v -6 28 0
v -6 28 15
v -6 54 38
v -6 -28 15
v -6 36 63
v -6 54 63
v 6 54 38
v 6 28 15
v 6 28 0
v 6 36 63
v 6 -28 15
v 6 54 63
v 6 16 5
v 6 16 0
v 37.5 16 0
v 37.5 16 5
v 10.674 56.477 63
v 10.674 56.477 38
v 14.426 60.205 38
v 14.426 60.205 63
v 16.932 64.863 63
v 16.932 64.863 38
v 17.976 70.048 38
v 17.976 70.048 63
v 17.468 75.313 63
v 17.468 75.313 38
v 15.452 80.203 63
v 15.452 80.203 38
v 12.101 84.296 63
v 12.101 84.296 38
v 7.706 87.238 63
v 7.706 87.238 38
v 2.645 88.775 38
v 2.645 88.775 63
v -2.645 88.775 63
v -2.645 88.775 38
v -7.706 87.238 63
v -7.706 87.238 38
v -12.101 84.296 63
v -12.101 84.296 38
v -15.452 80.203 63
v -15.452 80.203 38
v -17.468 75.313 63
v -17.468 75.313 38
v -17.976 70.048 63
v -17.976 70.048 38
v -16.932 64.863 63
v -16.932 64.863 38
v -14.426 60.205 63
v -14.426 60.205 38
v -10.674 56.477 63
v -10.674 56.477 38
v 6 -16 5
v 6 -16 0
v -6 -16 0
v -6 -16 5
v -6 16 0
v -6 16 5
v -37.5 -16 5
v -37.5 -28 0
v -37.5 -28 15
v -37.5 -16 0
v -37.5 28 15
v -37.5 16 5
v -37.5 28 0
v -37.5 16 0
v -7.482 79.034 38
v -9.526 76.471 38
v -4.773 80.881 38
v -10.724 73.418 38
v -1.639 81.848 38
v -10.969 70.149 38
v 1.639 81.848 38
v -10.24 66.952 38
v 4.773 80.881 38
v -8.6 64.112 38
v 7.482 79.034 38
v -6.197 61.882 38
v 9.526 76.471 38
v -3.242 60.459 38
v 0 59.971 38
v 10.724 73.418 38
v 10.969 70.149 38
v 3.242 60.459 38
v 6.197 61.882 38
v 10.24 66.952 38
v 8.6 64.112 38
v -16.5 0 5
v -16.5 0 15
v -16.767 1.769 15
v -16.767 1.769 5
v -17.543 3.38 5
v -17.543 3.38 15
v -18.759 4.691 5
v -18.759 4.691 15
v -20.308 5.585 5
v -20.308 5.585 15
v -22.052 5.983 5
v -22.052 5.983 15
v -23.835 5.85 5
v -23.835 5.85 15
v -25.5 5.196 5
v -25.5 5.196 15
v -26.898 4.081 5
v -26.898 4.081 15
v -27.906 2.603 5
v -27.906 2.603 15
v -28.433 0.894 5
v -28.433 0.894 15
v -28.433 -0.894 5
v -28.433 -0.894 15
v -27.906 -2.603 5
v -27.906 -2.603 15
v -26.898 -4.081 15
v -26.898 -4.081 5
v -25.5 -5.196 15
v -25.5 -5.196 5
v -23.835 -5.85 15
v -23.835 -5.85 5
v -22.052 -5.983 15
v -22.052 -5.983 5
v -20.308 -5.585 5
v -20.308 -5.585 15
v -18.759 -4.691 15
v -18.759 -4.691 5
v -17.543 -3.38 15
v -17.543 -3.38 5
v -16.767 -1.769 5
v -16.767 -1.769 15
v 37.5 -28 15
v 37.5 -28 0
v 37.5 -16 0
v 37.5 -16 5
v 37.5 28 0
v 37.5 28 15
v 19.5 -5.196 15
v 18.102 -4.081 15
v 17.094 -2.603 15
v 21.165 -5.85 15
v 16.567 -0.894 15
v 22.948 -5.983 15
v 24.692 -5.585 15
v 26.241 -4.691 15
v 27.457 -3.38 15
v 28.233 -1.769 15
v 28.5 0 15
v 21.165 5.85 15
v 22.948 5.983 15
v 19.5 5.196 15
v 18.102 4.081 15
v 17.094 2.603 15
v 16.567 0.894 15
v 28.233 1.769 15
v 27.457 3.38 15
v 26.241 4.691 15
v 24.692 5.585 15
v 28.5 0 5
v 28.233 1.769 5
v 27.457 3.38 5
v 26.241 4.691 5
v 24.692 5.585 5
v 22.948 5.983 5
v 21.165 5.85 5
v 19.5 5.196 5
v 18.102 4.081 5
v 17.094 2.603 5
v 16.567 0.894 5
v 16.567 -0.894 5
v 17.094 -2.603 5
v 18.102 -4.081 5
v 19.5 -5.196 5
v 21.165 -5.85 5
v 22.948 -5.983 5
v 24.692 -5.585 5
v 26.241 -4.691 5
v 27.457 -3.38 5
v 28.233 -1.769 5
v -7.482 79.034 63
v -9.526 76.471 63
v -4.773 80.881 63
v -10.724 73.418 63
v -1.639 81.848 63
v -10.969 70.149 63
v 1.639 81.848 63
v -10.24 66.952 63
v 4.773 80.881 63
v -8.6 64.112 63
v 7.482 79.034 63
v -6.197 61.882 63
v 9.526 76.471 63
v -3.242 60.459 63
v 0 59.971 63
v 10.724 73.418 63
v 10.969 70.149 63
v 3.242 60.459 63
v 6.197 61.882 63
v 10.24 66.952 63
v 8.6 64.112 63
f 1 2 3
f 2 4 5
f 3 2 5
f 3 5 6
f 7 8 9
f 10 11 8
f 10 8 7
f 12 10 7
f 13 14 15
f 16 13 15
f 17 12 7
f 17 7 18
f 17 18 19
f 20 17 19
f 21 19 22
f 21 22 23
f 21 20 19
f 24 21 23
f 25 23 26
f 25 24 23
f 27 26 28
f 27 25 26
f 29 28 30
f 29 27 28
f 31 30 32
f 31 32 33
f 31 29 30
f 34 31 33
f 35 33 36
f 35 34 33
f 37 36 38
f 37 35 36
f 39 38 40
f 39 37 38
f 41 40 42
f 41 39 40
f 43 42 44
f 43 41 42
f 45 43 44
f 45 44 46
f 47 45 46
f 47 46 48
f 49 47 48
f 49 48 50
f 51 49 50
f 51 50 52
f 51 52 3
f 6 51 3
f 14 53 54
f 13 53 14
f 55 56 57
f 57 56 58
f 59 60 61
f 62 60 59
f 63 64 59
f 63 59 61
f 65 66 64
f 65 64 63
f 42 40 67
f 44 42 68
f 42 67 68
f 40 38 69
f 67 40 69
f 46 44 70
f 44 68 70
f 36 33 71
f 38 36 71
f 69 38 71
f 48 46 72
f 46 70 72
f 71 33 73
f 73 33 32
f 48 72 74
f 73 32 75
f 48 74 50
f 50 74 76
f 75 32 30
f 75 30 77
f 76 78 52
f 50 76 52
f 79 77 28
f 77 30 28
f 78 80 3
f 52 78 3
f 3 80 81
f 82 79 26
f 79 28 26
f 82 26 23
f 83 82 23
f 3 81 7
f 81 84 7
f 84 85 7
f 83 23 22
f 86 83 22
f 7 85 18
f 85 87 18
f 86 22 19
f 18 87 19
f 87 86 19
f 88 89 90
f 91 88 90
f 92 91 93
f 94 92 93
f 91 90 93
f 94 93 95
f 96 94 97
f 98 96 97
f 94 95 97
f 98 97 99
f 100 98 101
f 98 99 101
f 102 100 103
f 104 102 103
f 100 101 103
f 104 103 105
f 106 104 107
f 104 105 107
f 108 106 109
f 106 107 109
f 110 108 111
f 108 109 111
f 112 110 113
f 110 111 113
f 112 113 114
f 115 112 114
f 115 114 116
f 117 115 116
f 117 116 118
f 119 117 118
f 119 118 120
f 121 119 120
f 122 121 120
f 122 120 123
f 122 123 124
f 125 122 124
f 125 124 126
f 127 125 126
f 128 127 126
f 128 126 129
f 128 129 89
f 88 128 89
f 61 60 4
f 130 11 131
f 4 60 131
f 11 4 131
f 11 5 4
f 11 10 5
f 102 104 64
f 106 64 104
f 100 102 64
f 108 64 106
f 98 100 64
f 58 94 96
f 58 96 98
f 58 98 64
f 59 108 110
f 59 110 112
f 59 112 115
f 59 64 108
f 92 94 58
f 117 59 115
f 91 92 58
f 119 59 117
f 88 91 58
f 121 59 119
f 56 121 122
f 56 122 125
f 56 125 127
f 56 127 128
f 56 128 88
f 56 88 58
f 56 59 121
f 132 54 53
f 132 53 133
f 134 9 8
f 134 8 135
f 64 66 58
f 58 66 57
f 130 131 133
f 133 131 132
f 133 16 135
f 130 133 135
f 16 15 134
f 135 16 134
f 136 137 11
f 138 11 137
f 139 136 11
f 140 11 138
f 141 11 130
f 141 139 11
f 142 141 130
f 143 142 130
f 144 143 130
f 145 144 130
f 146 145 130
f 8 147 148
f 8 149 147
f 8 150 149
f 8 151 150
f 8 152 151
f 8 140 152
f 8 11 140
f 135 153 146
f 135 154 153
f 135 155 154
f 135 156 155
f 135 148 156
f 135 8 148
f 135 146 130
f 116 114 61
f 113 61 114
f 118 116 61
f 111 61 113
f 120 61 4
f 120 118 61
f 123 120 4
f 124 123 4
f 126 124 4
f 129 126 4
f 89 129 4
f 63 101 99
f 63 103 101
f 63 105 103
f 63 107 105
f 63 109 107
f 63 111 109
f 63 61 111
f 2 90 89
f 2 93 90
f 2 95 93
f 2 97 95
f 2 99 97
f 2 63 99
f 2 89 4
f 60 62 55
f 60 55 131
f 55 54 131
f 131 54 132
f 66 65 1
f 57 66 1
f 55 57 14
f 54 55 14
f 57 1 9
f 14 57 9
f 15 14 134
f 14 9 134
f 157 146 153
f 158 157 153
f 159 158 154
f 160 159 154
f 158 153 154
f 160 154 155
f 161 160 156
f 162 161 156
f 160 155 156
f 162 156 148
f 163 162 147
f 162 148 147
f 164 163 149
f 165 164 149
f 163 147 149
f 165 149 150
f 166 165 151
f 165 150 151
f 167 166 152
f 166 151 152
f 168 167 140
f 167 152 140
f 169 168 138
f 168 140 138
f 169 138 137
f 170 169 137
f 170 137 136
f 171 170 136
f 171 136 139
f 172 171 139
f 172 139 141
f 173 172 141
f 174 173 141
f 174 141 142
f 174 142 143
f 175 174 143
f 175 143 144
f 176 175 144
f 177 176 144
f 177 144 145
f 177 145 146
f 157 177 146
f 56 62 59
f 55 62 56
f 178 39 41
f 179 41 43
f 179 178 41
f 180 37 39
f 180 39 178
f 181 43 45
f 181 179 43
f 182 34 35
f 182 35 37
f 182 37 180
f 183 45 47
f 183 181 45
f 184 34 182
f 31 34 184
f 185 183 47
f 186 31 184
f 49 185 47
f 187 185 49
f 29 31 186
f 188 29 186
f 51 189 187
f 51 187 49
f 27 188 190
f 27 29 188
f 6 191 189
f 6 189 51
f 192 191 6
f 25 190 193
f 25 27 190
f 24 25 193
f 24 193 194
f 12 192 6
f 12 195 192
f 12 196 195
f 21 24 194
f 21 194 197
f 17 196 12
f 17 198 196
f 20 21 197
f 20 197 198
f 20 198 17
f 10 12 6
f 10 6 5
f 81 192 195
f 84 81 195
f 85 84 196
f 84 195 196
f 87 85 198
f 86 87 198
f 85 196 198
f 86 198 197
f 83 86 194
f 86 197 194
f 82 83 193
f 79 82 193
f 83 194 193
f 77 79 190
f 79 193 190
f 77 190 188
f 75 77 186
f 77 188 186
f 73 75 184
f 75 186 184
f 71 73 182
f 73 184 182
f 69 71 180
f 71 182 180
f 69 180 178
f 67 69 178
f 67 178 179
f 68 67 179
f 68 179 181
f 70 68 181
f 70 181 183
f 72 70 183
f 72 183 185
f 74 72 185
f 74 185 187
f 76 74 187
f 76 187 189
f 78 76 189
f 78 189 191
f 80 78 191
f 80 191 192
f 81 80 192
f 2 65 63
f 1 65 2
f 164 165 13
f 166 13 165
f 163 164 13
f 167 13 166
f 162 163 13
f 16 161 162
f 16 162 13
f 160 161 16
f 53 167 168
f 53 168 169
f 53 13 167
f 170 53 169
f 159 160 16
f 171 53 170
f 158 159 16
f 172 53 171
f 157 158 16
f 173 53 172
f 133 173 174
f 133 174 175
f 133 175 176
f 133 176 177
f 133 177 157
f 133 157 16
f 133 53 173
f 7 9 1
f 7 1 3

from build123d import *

# Parameters (mm, degrees)
SKETCH_W        = 75
SKETCH_H        = 56
PAD_DEPTH       = 15
SKETCH001_R     = 6
POCKET_DEPTH    = 15.001
SKETCH002_W     = 111.933372
SKETCH002_H     = 32
POCKET001_DEPTH = 5
PAD001_DEPTH    = 6
SKETCH004_R     = 18
PAD002_DEPTH    = 25
SKETCH005_R     = 11
POCKET002_DEPTH = 63.001


with BuildPart() as pocket001:
    # Sketch → Pad (new body)
    with BuildSketch(Plane.XY):
        Rectangle(SKETCH_W, SKETCH_H)
    extrude(amount=PAD_DEPTH)

    # Sketch001 → Pocket (cut, through all)
    with BuildSketch(Plane.XY.offset(15)):
        with Locations((-22.5, 0)):
            Circle(SKETCH001_R)
        with Locations((22.5, 0)):
            Circle(SKETCH001_R)
    extrude(amount=-POCKET_DEPTH, mode=Mode.SUBTRACT)

    # Sketch002 → Pocket001 (cut)
    with BuildSketch(Plane(origin=(0, 0, 0), x_dir=(1, 0, 0), z_dir=(0, 0, -1))):
        with Locations((5.213337, 0)):
            Rectangle(SKETCH002_W, SKETCH002_H)
    extrude(amount=-POCKET001_DEPTH, mode=Mode.SUBTRACT)


with BuildPart() as fusion:
    # Sketch003 → Pad001 (new body, symmetric)
    with BuildSketch(Plane.YZ):
        Polygon((-28, 0), (28, 0), (54, 38), (54, 63), (36, 63), (-28, 15), align=None)
    extrude(amount=PAD001_DEPTH, both=True)

    # Sketch004 → Pad002 (new body)
    with BuildSketch(Plane(origin=(0, 0, 63), x_dir=(0, -1, 0), z_dir=(0, 0, 1))):
        with Locations((-70.970563, 0)):
            Circle(SKETCH004_R)
    extrude(amount=-PAD002_DEPTH)

    # Sketch005 → Pocket002 (cut, through all)
    with BuildSketch(Plane(origin=(0, 0, 63), x_dir=(0, -1, 0), z_dir=(0, 0, 1))):
        with Locations((-70.970563, 0)):
            Circle(SKETCH005_R)
    extrude(amount=-POCKET002_DEPTH, mode=Mode.SUBTRACT)

    # Fusion: union Pocket001
    add(pocket001.part)


solid = fusion.part
